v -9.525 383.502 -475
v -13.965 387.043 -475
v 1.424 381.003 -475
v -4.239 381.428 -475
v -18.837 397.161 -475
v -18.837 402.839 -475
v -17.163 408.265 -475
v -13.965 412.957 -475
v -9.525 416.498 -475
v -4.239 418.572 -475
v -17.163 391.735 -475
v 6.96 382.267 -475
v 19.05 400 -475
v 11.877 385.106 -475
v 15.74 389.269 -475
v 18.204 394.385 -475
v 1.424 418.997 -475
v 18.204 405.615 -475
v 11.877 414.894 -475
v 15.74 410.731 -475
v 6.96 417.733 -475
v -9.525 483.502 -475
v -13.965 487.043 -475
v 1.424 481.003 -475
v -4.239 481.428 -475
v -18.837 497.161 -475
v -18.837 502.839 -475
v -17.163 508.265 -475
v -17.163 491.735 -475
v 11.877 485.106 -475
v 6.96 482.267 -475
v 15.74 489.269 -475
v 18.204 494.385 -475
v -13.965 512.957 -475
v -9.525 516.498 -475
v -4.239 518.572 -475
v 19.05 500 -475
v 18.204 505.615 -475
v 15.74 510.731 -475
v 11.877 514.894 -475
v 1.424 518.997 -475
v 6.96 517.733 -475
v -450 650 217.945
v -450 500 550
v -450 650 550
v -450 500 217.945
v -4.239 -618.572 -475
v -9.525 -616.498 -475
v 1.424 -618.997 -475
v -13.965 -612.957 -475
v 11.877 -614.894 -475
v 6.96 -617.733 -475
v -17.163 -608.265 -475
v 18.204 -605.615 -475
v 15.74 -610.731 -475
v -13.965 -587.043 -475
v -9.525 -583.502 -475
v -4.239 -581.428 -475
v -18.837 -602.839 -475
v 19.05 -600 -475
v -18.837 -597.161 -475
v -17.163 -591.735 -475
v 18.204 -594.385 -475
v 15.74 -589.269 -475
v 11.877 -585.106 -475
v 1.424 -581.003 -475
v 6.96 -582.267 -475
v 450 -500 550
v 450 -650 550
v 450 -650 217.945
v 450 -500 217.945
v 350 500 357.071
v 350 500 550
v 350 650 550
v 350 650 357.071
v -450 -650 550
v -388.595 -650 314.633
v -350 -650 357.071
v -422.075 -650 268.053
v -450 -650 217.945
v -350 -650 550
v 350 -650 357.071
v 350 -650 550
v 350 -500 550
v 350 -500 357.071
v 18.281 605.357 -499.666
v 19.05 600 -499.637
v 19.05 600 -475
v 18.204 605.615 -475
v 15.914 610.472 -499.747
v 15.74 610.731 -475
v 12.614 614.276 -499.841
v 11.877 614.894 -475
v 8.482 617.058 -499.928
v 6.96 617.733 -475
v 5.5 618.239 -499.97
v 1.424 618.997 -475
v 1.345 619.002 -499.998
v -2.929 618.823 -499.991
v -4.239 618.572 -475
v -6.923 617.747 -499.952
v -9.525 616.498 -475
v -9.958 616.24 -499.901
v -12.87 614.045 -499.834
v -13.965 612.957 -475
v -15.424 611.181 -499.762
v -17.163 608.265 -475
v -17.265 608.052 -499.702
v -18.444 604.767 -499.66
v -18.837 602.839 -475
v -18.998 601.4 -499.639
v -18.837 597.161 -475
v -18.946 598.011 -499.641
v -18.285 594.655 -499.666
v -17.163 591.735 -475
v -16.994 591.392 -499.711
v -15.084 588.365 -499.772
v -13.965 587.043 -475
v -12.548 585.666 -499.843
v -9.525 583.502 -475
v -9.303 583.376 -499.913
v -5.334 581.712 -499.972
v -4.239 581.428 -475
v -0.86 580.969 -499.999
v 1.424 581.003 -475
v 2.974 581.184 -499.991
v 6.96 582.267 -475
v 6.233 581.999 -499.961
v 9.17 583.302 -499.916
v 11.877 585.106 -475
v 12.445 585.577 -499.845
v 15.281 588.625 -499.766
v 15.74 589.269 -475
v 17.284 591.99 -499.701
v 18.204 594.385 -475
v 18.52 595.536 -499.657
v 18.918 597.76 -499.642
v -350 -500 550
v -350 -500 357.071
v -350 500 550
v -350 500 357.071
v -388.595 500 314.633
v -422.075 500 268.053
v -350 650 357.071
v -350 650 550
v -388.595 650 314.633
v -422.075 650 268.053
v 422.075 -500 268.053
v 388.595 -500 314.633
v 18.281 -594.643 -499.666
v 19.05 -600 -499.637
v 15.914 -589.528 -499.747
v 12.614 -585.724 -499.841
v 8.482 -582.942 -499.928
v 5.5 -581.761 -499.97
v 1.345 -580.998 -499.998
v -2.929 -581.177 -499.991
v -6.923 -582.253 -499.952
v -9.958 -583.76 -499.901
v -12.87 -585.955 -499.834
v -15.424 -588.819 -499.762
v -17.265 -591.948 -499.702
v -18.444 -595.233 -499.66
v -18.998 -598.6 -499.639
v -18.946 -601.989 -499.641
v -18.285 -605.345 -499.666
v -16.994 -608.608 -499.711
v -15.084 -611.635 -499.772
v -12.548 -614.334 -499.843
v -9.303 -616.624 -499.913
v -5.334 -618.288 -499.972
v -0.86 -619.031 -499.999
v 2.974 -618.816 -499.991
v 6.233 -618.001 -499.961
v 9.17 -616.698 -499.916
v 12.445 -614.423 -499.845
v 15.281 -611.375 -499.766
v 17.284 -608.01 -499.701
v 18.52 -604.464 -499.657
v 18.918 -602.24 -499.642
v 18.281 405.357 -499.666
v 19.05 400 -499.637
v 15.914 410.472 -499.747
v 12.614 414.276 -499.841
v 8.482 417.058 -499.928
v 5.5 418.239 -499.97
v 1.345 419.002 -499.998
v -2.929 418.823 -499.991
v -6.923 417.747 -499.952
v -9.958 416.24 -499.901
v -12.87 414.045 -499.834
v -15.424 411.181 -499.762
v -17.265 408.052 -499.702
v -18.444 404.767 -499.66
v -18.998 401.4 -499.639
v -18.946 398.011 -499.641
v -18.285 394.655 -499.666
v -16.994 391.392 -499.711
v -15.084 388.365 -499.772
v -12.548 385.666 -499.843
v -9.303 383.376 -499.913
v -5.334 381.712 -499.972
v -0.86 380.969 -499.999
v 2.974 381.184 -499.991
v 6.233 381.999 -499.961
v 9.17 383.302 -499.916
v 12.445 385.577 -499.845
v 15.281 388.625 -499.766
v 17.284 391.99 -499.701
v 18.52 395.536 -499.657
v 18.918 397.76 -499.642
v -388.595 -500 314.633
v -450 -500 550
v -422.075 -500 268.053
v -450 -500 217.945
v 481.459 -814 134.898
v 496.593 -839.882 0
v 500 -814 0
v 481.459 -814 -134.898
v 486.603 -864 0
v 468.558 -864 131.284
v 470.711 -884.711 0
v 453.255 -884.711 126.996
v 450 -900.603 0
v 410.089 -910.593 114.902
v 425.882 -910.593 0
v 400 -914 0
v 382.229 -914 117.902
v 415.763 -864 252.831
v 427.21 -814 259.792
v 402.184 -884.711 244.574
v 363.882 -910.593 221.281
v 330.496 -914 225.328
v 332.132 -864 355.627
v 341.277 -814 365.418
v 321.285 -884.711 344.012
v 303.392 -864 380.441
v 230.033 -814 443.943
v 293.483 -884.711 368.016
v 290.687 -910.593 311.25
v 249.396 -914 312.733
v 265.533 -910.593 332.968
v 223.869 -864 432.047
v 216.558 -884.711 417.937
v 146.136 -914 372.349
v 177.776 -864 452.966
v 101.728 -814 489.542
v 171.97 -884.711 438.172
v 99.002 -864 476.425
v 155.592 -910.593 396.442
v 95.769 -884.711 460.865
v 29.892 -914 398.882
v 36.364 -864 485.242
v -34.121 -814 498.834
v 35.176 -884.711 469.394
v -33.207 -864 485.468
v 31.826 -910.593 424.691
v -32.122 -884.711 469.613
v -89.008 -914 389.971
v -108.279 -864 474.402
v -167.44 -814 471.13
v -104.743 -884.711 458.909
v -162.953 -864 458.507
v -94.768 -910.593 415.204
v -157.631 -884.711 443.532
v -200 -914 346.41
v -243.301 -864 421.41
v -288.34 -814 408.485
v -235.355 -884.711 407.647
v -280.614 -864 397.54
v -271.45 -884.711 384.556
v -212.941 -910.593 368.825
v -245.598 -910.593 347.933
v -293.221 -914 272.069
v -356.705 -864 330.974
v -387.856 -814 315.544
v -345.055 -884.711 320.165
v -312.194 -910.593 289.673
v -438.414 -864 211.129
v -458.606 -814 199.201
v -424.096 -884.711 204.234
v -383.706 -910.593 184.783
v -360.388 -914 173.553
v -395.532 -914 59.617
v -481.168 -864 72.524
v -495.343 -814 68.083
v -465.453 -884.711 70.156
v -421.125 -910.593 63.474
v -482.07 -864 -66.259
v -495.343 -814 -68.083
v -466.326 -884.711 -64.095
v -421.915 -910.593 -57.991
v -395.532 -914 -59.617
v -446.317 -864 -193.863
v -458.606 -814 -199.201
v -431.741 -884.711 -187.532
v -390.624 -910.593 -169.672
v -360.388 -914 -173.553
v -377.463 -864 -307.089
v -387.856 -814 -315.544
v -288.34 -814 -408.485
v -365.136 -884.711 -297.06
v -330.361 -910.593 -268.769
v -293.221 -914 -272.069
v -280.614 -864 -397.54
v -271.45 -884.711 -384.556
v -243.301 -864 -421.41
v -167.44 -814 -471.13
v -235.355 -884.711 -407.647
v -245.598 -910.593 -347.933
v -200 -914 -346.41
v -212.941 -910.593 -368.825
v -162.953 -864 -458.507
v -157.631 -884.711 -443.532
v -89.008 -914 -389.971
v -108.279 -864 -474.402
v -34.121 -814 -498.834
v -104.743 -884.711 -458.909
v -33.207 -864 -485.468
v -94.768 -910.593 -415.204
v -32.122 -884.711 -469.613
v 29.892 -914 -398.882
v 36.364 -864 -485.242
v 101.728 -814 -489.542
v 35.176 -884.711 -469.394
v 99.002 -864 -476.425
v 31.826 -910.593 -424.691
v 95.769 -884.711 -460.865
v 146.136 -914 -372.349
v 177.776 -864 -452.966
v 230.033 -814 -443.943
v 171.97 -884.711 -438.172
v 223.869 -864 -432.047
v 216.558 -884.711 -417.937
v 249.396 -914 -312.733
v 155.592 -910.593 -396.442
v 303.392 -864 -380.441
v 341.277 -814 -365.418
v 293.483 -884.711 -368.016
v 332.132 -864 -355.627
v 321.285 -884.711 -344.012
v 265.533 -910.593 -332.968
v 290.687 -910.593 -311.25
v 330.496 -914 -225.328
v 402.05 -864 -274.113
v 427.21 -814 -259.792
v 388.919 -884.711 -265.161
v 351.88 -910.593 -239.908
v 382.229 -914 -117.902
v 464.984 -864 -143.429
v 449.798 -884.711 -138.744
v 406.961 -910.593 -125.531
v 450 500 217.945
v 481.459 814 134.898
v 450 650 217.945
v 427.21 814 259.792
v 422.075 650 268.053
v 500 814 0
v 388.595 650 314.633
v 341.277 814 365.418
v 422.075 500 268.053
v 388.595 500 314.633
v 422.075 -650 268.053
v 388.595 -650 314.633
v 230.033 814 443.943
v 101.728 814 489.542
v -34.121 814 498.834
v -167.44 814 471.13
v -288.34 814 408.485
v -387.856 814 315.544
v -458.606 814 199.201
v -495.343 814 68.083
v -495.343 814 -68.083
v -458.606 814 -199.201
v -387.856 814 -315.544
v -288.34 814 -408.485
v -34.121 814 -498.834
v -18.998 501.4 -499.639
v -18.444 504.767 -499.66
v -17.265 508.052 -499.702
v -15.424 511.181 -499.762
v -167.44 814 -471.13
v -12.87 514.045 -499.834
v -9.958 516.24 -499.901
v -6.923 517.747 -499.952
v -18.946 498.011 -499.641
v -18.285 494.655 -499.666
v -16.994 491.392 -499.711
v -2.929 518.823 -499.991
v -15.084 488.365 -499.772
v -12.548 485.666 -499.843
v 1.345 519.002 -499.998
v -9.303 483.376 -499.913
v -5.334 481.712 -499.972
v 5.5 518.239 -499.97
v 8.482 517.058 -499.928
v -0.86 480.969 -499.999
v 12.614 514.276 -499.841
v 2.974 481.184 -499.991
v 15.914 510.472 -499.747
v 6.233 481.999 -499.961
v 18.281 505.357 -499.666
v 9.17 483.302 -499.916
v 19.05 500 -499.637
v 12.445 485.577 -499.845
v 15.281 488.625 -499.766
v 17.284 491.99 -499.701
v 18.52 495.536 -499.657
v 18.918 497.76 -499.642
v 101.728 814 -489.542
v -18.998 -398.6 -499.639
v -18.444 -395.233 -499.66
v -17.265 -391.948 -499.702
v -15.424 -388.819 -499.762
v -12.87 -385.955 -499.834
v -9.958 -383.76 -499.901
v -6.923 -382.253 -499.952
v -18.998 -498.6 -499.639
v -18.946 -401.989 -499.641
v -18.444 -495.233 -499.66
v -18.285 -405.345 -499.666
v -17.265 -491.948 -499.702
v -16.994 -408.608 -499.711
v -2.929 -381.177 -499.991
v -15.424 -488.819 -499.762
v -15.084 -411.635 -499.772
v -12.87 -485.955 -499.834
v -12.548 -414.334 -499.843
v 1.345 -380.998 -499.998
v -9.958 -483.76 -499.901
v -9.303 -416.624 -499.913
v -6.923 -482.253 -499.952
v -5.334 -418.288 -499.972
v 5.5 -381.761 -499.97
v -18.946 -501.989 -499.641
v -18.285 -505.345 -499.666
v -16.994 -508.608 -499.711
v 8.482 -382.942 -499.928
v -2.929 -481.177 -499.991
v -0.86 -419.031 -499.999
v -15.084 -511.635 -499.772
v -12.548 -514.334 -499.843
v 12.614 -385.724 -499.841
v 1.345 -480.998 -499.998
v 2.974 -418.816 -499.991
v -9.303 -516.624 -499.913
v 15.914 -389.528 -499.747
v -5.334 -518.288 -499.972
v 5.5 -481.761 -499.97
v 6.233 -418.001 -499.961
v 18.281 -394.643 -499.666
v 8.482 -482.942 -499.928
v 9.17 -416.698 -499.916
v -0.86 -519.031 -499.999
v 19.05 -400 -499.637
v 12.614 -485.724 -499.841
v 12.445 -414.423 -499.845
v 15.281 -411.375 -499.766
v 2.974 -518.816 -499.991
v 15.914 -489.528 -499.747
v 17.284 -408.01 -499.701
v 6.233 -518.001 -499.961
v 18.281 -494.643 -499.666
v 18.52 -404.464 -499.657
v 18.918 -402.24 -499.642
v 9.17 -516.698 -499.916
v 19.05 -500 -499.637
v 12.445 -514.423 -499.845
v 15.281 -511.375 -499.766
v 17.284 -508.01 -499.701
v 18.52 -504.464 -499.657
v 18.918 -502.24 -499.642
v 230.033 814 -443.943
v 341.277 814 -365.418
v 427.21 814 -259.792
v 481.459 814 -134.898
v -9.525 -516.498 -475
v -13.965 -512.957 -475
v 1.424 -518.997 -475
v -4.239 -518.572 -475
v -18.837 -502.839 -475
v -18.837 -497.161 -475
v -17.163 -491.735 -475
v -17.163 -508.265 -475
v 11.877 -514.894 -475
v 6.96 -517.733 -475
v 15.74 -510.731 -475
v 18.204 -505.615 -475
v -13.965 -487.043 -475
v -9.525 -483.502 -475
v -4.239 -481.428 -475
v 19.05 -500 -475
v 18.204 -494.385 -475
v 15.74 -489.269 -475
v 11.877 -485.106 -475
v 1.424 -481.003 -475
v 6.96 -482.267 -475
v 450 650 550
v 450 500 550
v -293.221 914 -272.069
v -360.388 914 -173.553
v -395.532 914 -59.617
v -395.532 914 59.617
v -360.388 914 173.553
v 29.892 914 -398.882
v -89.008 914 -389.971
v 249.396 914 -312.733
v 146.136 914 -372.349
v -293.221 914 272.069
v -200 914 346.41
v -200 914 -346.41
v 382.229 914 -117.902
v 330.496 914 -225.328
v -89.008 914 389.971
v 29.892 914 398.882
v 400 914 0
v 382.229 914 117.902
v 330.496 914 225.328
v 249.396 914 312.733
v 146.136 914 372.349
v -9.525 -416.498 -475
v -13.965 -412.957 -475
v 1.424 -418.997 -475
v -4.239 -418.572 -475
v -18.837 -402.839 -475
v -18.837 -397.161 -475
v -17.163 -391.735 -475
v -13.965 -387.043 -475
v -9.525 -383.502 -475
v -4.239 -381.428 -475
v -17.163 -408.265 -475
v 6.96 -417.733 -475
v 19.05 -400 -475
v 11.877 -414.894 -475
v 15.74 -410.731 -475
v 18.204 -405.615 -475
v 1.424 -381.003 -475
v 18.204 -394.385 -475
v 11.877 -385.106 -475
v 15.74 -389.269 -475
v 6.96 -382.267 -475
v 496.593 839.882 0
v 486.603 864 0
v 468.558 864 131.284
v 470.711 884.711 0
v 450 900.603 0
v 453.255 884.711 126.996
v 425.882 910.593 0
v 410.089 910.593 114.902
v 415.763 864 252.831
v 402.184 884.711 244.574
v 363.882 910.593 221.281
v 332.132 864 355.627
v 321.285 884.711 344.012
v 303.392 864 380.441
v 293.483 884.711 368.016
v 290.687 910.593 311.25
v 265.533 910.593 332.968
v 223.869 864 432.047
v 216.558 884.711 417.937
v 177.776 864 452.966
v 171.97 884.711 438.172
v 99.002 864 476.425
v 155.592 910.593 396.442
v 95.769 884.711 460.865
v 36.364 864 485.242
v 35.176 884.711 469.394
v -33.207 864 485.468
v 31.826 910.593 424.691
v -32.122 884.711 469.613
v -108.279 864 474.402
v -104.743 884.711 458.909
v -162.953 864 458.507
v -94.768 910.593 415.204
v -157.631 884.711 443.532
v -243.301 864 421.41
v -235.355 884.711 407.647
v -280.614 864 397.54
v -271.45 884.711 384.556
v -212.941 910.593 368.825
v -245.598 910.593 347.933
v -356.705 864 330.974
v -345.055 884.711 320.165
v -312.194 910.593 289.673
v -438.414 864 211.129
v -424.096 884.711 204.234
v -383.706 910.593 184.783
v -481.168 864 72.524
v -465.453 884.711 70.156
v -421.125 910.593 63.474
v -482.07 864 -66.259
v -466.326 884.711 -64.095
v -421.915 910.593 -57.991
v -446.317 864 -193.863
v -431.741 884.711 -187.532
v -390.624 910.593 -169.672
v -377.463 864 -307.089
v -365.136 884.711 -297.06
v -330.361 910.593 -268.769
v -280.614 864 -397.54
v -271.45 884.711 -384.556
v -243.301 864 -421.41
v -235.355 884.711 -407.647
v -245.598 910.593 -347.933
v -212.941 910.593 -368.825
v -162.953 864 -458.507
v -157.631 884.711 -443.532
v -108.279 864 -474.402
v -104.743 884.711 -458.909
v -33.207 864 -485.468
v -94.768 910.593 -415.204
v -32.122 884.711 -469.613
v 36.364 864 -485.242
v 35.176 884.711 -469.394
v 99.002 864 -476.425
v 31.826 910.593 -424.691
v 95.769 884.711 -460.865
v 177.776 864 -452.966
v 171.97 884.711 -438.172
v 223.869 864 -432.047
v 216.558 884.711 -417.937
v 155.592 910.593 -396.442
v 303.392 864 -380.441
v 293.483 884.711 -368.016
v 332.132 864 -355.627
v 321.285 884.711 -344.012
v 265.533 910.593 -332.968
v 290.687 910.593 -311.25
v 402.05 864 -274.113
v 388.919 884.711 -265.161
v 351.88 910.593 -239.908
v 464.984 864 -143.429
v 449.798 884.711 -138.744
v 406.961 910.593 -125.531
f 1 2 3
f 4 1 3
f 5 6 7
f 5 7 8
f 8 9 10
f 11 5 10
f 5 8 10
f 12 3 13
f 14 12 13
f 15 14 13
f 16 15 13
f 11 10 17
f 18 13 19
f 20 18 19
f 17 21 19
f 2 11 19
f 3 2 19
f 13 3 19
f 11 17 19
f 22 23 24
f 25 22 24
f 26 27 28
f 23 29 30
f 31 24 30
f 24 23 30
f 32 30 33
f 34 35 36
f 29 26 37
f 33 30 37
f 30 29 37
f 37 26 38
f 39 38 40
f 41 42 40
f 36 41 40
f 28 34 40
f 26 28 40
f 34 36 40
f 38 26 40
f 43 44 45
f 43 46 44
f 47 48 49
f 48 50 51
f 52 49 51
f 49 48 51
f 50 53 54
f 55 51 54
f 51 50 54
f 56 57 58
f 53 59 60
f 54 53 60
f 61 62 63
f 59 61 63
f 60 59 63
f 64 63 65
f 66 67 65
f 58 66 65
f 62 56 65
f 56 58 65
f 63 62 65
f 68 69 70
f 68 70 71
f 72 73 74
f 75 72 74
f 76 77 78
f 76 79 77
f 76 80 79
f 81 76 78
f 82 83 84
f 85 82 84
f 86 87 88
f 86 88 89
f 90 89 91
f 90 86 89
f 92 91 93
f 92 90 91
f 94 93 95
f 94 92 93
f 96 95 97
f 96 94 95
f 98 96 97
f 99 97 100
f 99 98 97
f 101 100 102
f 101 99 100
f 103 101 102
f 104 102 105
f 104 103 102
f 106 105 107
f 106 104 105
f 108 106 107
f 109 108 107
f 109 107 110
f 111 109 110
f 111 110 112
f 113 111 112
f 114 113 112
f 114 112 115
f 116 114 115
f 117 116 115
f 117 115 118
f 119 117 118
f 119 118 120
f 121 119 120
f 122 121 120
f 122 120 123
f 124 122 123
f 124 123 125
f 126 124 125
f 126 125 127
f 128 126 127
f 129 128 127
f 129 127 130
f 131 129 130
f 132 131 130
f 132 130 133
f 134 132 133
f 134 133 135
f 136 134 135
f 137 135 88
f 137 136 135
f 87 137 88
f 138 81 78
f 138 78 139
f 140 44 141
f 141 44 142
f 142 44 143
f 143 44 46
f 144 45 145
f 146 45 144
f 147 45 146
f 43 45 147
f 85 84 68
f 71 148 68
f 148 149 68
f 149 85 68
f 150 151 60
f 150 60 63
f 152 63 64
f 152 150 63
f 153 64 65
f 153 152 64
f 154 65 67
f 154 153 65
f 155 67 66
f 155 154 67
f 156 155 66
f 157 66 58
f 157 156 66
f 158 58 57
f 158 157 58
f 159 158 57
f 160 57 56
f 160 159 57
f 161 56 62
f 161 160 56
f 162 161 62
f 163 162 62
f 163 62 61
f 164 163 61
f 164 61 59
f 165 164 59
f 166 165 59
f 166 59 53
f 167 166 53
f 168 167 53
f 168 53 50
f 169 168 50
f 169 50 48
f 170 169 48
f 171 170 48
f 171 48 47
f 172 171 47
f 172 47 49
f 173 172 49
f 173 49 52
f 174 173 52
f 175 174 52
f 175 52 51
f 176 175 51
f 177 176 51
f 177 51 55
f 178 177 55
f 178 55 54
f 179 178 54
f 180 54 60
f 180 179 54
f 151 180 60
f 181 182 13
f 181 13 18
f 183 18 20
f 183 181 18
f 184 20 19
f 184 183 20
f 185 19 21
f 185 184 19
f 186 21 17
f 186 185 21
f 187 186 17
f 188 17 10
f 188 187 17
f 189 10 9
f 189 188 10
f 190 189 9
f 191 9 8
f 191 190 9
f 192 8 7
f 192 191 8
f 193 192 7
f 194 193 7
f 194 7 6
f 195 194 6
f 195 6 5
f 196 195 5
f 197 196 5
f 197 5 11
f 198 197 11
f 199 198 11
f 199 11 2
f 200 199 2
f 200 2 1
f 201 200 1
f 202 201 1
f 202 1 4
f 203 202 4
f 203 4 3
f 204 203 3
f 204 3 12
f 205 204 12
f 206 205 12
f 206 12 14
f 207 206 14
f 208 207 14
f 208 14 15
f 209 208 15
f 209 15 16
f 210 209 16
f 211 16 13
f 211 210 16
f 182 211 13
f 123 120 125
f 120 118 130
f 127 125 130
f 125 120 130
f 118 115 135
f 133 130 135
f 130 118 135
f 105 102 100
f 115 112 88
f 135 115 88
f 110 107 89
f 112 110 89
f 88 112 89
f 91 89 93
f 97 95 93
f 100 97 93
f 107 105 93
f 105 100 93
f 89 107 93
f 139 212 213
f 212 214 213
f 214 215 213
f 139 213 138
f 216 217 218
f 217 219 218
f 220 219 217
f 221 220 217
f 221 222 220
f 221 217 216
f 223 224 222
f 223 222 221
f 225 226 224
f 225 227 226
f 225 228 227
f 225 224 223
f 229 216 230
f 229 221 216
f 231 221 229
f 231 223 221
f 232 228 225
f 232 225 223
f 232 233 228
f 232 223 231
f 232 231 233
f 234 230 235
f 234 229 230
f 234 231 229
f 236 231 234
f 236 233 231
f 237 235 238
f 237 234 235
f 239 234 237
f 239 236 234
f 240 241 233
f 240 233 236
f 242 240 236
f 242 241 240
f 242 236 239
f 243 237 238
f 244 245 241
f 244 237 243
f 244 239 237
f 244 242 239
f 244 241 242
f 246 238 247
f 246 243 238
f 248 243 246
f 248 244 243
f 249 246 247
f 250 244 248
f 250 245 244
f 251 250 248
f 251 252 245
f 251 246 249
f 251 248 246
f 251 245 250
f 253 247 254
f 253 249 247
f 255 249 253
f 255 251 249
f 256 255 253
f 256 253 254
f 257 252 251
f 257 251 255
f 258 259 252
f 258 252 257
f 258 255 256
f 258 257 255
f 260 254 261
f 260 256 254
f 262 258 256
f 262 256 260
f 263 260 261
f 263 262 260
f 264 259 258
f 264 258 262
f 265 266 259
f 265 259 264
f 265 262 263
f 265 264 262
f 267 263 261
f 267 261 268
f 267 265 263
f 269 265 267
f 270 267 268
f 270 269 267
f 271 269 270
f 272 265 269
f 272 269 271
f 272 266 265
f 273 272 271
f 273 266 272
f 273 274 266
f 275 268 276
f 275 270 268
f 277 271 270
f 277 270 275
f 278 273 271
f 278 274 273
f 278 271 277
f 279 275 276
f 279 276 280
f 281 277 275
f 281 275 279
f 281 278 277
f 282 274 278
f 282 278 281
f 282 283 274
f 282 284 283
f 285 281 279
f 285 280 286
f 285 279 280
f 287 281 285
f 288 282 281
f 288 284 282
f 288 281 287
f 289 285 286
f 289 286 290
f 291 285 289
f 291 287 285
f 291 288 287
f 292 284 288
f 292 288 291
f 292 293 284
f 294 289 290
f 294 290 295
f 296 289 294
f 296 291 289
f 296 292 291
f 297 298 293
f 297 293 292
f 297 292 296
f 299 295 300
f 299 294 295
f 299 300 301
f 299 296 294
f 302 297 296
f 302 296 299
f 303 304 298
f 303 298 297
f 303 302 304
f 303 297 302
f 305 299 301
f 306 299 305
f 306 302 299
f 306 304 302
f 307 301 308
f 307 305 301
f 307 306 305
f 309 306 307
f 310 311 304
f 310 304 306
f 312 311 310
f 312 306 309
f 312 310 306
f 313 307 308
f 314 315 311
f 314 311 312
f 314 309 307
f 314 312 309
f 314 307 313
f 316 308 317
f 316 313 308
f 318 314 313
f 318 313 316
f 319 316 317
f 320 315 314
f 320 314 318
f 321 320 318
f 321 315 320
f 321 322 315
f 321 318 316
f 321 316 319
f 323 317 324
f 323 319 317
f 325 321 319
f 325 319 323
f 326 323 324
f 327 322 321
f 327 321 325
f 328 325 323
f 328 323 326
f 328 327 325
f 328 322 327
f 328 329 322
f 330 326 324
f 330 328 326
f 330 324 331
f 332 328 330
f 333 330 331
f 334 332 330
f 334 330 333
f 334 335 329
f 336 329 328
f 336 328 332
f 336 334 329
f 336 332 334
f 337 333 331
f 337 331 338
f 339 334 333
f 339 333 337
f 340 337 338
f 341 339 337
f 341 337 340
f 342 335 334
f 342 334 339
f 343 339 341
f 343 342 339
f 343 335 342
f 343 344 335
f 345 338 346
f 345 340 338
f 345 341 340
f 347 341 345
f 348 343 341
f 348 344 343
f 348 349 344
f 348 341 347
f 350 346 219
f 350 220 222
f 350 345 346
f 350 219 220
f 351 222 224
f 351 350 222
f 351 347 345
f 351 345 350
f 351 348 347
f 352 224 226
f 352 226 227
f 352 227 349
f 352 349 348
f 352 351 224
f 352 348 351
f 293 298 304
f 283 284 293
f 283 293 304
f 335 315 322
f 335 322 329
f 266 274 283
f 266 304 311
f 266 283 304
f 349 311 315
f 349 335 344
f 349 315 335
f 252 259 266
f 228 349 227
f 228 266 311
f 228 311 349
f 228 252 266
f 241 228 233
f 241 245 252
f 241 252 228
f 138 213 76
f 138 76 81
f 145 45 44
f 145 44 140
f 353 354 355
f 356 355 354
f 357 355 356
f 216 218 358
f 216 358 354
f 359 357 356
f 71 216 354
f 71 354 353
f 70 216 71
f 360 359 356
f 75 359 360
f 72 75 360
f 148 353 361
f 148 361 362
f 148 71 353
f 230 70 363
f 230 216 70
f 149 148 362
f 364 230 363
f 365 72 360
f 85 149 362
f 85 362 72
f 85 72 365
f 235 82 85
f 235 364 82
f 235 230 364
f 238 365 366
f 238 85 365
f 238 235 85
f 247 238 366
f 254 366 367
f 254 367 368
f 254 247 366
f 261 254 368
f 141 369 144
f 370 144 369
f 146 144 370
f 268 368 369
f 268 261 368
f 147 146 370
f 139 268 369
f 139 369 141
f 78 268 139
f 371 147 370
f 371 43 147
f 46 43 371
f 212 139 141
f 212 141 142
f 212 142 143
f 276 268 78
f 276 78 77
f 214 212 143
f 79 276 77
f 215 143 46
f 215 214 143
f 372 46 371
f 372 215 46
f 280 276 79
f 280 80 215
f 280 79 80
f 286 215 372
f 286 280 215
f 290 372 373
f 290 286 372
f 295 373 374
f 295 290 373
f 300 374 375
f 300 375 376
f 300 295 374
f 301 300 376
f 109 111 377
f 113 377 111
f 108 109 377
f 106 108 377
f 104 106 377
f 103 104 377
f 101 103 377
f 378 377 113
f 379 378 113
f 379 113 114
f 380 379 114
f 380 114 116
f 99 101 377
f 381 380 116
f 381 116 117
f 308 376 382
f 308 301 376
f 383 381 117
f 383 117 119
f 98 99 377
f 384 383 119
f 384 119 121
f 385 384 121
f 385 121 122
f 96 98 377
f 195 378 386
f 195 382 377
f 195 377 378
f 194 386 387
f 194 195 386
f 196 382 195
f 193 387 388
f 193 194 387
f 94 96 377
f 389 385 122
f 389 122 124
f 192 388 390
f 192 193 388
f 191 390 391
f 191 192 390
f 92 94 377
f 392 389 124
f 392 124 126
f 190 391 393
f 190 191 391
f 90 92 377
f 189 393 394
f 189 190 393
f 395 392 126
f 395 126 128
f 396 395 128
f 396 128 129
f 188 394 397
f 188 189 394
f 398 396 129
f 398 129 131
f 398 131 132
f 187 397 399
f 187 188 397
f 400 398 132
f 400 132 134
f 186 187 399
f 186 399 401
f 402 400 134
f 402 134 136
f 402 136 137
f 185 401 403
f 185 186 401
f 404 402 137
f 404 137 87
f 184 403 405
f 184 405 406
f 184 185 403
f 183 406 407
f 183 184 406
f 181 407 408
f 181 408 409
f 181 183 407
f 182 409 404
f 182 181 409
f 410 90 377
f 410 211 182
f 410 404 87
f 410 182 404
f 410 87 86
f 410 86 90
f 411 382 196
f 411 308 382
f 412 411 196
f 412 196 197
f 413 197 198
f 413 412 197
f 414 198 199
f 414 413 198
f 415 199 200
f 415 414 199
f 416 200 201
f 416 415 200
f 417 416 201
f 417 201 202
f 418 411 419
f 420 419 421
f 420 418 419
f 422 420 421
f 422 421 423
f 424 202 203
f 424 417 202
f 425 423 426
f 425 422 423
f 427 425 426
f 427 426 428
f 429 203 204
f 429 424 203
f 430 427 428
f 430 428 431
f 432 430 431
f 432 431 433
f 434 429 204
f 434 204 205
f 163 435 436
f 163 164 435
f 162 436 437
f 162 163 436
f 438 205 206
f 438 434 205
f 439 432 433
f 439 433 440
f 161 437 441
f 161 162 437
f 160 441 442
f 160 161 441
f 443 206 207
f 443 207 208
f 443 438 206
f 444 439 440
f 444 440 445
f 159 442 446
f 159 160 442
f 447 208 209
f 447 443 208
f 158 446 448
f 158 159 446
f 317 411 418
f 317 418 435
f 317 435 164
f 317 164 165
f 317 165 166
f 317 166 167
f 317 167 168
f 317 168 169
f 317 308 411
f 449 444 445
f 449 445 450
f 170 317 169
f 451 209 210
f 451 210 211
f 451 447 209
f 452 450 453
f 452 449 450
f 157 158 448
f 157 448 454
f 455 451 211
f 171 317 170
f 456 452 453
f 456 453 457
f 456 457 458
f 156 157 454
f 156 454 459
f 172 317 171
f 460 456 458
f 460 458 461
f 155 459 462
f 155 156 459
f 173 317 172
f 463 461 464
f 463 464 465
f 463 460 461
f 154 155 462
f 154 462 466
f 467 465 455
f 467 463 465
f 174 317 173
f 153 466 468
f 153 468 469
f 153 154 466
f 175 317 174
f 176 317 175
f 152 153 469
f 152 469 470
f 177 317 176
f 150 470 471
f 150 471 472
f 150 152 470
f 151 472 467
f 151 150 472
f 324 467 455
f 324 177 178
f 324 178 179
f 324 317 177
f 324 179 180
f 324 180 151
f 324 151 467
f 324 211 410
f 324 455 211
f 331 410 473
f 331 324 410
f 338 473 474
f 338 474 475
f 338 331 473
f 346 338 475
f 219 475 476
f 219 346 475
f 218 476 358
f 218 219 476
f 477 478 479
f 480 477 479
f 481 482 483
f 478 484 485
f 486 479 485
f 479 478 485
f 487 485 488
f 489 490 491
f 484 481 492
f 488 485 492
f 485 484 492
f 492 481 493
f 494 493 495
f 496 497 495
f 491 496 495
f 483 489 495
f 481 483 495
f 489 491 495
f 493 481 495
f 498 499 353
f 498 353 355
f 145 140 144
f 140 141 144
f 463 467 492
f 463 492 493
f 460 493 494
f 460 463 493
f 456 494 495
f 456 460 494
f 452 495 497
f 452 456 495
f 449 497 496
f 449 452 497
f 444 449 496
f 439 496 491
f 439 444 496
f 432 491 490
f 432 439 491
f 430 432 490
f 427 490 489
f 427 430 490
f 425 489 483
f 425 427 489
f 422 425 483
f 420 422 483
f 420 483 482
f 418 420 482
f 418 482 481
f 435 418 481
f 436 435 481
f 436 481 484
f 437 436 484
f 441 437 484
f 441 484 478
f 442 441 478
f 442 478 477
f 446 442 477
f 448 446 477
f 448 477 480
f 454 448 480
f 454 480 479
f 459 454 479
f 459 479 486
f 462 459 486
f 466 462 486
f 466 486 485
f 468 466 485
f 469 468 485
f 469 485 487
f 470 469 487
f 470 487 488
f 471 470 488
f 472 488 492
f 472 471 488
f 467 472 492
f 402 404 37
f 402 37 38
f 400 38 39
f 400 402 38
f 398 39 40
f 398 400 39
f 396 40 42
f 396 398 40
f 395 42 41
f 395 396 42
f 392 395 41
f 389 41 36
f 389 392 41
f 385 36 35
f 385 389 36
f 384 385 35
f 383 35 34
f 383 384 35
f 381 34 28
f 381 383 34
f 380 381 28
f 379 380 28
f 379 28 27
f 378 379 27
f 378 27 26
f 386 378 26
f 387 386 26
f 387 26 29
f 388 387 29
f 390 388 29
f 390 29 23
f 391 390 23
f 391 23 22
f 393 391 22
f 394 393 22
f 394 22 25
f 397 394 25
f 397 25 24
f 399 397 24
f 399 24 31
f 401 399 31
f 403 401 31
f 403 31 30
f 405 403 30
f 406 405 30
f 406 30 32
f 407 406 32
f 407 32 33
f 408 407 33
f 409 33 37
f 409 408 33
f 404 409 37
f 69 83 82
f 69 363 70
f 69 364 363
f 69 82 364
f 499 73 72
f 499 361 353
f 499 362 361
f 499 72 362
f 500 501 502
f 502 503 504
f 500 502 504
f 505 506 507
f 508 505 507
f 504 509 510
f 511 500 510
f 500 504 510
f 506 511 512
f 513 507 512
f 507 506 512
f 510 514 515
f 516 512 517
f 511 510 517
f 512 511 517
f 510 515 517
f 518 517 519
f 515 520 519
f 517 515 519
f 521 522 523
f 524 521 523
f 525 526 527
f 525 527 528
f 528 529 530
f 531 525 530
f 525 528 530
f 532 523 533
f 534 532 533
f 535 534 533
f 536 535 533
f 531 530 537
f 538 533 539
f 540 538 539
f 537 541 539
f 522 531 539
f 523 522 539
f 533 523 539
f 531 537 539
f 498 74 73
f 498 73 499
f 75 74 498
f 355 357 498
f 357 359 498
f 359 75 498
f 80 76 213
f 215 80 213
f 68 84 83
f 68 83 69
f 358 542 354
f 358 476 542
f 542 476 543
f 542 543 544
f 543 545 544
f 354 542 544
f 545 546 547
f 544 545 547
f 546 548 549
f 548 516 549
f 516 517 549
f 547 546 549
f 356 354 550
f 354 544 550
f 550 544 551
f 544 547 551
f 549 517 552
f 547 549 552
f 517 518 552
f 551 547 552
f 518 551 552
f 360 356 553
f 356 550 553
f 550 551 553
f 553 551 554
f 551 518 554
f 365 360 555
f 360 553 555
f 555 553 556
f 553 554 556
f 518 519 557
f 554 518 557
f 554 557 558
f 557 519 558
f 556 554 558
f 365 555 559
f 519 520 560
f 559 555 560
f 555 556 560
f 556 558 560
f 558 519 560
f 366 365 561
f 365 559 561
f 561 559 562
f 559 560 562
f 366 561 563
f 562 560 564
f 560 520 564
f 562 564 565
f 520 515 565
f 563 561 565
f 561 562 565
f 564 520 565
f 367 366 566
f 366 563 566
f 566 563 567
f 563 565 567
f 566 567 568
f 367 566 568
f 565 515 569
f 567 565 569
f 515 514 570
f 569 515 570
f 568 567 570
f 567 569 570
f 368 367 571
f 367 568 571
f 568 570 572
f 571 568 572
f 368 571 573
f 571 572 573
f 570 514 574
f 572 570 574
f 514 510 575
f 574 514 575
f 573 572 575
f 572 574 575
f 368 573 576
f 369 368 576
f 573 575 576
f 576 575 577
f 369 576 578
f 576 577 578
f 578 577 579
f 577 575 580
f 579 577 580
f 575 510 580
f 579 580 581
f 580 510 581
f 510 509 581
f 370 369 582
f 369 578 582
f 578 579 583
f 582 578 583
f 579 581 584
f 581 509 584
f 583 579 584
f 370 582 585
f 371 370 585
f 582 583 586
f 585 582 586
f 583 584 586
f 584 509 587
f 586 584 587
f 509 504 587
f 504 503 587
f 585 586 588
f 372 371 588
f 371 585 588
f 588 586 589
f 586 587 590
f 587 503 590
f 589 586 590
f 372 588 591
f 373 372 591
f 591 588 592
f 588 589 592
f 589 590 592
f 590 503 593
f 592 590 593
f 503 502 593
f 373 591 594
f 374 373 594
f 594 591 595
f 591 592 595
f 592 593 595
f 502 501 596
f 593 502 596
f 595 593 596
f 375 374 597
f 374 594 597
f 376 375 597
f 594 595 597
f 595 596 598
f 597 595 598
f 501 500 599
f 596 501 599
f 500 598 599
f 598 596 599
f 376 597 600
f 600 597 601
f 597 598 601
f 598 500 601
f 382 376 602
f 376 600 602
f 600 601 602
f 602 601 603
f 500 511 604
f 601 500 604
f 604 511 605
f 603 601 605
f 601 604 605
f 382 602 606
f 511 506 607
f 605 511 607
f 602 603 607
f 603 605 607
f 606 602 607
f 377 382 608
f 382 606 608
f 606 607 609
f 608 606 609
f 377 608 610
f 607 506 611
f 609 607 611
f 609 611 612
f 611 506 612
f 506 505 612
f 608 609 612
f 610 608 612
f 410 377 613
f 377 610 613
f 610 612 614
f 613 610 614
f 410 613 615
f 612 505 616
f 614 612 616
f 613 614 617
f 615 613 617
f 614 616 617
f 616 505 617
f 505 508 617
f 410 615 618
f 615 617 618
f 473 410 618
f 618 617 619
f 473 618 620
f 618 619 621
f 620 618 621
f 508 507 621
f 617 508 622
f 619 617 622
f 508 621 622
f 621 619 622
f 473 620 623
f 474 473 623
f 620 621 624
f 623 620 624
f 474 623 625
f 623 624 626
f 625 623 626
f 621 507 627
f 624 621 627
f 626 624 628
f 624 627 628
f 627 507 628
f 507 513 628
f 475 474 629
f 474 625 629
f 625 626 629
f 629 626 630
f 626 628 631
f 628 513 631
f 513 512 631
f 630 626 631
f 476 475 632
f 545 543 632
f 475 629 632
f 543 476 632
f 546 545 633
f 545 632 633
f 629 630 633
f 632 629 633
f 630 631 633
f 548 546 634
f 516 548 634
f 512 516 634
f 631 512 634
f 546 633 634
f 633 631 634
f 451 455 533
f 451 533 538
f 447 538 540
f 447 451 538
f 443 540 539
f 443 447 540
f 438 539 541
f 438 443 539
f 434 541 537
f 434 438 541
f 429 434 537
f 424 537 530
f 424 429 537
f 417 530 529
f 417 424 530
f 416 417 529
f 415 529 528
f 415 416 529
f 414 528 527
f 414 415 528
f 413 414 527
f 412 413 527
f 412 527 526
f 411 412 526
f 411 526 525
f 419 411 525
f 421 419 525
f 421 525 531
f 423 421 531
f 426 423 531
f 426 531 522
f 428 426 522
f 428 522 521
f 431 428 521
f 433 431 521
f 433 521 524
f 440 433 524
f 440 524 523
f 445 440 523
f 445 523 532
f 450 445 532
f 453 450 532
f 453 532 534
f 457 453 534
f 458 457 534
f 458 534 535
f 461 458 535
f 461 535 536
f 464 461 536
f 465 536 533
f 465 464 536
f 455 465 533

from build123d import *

# Parameters (mm, degrees)
F0_R          = 500
F1_DEPTH      = 914
F1_DEPTH_BACK = 914
F2_R          = 100
F4_W          = 100
F4_H          = 150
F5_DEPTH      = 283.055052823
F5_DEPTH_BACK = 50
F7_R          = 19.05
F8_DEPTH      = 25


with BuildPart() as f1:
    # F0 (on Front) → F1 (new body, two sides)
    with BuildSketch(Plane.XZ) as f1_sk:
        Circle(F0_R)
    extrude(amount=F1_DEPTH)
    extrude(f1_sk.sketch, amount=-F1_DEPTH_BACK)

    # F2
    f2_edges = [f1.edges().sort_by_distance(p)[0] for p in [
        (-500, -914, 0),
        (-500, 914, 0),
    ]]
    fillet(f2_edges, radius=F2_R)

    # F4 (on offset) → F5 (join, two sides)
    with BuildSketch(Plane.XY.offset(500)) as f5_sk:
        with Locations((-400, 575)):
            Rectangle(F4_W, F4_H)
        with Locations((400, 575)):
            Rectangle(F4_W, F4_H)
        with Locations((400, -575)):
            Rectangle(F4_W, F4_H)
        with Locations((-400, -575)):
            Rectangle(F4_W, F4_H)
    extrude(amount=-F5_DEPTH)
    extrude(f5_sk.sketch, amount=F5_DEPTH_BACK)

    # F7 (on offset) → F8 (cut)
    with BuildSketch(Plane.XY.offset(-500)):
        with Locations((0, -600)):
            Circle(F7_R)
        with Locations((0, -500)):
            Circle(F7_R)
        with Locations((0, -400)):
            Circle(F7_R)
        with Locations((0, 500)):
            Circle(F7_R)
        with Locations((0, 400)):
            Circle(F7_R)
        with Locations((0, 600)):
            Circle(F7_R)
    extrude(amount=F8_DEPTH, mode=Mode.SUBTRACT)


solid = f1.part
